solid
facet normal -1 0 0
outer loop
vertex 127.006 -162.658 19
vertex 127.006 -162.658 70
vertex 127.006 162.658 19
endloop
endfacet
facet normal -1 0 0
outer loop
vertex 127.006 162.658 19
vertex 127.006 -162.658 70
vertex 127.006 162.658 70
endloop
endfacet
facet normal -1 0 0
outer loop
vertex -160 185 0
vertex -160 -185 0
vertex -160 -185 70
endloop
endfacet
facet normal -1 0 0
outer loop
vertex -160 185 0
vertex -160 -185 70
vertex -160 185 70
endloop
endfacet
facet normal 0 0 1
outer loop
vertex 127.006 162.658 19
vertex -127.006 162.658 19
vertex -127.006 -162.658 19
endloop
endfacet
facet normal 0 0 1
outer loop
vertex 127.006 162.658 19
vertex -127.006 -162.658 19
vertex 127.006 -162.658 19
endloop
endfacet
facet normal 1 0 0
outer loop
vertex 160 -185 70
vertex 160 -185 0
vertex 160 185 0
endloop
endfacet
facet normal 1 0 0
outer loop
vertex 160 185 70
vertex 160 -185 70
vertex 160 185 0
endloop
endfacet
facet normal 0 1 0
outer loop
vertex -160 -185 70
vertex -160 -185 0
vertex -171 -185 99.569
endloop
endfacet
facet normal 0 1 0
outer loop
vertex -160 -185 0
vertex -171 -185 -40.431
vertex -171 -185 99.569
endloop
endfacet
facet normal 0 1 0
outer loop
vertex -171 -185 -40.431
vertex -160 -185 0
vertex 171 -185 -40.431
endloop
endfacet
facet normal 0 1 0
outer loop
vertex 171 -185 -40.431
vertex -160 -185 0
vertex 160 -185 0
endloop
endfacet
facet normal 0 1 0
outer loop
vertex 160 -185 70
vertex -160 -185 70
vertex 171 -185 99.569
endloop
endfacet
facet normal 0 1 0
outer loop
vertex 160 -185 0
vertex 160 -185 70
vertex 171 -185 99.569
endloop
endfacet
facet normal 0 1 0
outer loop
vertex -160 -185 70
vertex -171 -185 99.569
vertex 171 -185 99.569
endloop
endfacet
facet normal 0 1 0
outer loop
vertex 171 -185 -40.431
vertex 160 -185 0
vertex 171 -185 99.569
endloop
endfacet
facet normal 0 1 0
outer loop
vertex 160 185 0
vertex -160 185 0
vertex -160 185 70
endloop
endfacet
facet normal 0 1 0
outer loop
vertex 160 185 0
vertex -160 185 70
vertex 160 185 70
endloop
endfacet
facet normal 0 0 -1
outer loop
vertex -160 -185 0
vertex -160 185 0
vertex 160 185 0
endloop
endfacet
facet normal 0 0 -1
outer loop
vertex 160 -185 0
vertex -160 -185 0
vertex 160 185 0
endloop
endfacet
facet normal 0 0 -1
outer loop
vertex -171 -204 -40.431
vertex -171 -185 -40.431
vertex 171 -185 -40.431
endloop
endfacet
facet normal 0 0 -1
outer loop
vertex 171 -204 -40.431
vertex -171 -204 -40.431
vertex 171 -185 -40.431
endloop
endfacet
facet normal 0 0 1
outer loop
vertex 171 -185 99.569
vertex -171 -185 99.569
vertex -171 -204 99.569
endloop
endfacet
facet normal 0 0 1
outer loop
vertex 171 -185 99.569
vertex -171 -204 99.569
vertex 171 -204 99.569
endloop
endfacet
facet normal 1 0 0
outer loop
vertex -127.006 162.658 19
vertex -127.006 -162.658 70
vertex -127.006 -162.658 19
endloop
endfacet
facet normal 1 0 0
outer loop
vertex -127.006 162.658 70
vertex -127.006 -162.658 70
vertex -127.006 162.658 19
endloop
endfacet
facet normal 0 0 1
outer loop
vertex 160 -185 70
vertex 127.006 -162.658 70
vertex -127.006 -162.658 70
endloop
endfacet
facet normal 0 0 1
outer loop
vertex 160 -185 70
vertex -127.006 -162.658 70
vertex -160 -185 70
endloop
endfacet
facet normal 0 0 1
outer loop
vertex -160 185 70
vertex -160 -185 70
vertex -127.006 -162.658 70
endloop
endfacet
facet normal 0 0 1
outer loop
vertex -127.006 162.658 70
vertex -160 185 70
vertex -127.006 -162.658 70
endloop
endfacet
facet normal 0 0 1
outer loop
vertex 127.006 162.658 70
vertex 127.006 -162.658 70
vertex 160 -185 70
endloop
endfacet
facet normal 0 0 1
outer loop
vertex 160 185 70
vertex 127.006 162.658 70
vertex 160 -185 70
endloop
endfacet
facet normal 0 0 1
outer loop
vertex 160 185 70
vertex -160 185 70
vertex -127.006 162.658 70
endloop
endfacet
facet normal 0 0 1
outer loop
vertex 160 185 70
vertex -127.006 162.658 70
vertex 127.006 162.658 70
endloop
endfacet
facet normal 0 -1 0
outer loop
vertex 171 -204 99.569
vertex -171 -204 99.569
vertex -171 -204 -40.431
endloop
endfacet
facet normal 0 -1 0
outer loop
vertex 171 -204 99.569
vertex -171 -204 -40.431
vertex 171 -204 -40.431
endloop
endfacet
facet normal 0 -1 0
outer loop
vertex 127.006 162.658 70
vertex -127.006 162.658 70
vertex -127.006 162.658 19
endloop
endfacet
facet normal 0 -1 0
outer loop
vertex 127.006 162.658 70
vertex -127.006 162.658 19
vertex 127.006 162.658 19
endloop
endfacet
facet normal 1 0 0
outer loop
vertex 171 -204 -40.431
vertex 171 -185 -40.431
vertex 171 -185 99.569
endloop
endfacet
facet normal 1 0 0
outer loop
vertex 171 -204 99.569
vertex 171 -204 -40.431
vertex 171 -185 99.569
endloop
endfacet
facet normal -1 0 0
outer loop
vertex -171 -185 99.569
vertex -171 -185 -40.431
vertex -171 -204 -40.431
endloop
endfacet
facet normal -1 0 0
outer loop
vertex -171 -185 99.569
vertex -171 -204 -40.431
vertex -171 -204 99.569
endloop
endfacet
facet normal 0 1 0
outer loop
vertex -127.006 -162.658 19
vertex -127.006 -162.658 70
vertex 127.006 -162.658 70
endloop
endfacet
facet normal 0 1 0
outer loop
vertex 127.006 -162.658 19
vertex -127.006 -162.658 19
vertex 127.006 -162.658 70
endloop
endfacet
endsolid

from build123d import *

# Parameters (mm, degrees)
F0_W     = 320
F0_H     = 370
F1_DEPTH = 70
F2_W     = 254.012
F2_H     = 325.316
F3_DEPTH = 51
F4_W     = 342
F4_H     = 140
F5_DEPTH = 19


with BuildPart() as f1:
    # F0 (on Top) → F1 (new body)
    with BuildSketch(Plane.XY):
        Rectangle(F0_W, F0_H)
    extrude(amount=F1_DEPTH)

    # F2 (on face) → F3 (cut)
    with BuildSketch(Plane.XY.offset(70)):
        Rectangle(F2_W, F2_H)
    extrude(amount=-F3_DEPTH, mode=Mode.SUBTRACT)

    # F4 (on face) → F5 (join)
    with BuildSketch(Plane.XZ.offset(185)):
        with Locations((0, 29.569484)):
            Rectangle(F4_W, F4_H)
    extrude(amount=F5_DEPTH)


solid = f1.part
